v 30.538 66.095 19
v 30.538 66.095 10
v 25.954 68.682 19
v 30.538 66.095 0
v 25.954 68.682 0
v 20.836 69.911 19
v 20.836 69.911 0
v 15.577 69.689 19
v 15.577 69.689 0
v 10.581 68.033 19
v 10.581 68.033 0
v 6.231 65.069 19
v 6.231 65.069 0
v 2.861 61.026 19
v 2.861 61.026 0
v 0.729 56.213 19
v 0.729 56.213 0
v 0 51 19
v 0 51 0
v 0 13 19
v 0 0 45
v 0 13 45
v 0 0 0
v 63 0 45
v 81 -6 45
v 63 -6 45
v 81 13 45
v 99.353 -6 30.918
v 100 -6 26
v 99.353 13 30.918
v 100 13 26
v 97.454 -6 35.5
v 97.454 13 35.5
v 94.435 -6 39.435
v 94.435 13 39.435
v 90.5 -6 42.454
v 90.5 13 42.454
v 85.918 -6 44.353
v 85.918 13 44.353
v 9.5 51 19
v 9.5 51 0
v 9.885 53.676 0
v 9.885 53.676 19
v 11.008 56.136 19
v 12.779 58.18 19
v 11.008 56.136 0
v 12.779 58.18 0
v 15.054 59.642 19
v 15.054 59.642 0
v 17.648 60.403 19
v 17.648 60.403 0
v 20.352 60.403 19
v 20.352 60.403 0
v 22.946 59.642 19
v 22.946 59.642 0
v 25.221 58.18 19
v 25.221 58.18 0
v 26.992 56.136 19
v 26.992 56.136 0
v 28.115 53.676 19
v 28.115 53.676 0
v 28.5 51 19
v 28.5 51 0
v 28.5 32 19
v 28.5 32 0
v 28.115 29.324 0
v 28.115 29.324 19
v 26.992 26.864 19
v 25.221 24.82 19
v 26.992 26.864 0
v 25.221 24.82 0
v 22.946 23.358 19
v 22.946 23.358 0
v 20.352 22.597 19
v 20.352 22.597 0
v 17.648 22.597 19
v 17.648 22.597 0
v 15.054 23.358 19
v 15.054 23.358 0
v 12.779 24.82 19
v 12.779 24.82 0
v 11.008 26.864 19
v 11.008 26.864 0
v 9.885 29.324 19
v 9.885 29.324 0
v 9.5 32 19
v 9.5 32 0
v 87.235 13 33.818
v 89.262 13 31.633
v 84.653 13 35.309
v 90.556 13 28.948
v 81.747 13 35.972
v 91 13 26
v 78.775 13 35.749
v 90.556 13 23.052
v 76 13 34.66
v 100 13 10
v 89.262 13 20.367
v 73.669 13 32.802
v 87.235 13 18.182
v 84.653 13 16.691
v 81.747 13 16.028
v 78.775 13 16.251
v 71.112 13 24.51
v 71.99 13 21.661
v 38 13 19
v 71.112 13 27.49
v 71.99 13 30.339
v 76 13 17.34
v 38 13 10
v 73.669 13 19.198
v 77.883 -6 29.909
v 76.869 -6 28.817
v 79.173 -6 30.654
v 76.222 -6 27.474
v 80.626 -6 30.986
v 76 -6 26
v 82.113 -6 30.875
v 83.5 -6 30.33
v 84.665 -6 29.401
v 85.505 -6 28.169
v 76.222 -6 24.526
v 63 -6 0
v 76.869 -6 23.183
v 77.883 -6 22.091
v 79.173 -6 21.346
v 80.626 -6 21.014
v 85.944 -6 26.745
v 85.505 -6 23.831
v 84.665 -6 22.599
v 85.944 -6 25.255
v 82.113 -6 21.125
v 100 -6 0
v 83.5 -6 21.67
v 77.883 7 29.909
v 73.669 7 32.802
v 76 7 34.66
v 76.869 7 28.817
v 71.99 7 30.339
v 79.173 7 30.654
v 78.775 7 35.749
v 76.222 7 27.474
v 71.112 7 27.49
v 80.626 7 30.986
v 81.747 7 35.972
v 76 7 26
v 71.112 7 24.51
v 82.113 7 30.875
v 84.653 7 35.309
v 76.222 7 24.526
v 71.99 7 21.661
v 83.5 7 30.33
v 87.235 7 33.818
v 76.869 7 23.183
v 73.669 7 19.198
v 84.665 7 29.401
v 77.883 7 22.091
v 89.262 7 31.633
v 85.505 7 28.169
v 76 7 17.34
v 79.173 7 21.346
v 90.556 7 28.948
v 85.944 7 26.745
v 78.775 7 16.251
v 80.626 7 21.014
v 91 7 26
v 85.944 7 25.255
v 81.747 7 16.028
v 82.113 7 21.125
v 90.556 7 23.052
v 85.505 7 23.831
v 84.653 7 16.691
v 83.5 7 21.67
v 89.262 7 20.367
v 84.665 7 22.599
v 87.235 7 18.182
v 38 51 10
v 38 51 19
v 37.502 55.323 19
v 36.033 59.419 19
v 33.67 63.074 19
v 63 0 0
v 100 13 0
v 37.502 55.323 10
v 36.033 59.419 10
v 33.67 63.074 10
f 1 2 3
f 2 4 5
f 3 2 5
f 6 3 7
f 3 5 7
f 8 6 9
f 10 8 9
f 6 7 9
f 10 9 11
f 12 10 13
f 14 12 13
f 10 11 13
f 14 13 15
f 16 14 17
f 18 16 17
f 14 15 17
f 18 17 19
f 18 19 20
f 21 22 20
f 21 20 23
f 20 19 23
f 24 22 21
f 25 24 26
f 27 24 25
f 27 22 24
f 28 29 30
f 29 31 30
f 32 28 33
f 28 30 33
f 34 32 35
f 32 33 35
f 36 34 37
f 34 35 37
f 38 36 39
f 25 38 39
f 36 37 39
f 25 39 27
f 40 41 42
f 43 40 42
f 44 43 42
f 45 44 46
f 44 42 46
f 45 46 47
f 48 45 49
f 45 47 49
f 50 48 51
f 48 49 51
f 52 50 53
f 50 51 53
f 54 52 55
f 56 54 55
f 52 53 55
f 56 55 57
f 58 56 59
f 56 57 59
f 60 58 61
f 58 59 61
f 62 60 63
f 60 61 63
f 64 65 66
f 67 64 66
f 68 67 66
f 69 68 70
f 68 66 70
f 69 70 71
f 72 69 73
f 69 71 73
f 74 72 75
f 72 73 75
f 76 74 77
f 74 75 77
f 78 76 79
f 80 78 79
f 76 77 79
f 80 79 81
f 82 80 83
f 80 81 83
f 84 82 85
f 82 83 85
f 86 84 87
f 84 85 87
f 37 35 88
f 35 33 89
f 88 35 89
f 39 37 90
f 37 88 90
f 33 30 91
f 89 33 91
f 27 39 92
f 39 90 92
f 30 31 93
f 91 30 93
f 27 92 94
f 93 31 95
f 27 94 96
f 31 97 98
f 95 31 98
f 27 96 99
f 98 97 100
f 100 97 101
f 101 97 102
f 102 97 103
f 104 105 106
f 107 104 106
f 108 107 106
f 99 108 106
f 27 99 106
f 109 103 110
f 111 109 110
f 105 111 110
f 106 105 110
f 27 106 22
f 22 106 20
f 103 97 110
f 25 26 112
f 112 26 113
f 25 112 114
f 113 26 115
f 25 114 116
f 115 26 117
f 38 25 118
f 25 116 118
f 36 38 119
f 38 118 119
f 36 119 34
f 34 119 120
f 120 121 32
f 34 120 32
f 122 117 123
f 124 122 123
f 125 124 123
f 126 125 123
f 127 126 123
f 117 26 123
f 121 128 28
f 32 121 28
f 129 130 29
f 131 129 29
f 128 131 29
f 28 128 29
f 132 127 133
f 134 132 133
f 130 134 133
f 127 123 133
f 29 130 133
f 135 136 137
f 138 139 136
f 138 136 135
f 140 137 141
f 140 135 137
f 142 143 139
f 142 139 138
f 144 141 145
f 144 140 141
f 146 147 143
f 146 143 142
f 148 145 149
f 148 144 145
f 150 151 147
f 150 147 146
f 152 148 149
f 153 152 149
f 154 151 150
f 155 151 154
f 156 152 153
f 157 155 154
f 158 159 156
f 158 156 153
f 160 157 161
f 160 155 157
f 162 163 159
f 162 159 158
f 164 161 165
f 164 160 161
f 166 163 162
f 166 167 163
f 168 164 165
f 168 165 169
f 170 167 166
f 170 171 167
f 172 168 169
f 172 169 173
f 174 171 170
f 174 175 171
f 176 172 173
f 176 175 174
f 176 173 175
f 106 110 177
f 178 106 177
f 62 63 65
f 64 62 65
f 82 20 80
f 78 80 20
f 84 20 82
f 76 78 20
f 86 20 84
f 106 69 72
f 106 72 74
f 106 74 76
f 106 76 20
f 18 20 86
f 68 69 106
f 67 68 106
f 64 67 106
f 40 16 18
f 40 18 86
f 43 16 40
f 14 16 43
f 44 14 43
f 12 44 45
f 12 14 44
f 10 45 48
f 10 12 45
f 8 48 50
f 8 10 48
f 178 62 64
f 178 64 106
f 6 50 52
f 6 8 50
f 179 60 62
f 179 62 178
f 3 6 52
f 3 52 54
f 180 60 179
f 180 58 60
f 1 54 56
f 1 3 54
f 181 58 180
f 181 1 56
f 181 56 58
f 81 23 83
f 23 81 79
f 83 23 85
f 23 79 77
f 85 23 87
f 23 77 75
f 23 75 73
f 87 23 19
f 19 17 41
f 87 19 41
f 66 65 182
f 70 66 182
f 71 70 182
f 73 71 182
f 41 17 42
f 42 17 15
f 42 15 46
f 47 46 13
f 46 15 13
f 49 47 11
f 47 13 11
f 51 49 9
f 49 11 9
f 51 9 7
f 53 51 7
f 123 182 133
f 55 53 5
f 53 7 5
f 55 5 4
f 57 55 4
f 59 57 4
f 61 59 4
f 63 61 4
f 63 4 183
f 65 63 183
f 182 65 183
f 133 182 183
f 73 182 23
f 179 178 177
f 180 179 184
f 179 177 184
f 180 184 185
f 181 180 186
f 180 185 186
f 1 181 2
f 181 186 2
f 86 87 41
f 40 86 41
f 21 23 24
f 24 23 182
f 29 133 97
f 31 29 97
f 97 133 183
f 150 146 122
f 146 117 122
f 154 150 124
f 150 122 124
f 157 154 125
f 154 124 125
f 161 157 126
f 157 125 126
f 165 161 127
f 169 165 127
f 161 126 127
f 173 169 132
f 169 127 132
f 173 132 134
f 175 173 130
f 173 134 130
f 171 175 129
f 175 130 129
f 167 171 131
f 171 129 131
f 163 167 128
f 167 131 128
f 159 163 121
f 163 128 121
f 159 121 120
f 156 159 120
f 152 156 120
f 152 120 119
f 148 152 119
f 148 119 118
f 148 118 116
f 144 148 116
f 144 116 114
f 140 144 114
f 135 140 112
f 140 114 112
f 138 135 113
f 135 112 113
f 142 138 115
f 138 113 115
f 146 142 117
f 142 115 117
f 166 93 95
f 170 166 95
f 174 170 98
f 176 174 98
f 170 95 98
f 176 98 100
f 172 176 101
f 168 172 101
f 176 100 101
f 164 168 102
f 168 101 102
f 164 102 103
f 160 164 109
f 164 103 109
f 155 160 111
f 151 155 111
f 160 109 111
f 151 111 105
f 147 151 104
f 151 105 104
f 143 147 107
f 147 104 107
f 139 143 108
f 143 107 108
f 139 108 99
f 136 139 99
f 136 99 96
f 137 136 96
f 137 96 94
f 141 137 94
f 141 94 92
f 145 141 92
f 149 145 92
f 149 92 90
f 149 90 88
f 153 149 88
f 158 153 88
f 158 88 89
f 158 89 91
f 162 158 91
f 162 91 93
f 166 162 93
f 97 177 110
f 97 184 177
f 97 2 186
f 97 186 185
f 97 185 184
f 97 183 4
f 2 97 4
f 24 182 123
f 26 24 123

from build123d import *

# Parameters (mm, degrees)
BOSS_EXTRUDE1_DEPTH                     = 45
BOSS_EXTRUDE2_DEPTH                     = 19
BOSS_EXTRUDE3_DEPTH                     = 10
FILLET1_R                               = 19
CBORE_FOR_M5_HEX_HEAD_BOLT1_D           = 10
CBORE_FOR_M5_HEX_HEAD_BOLT1_DEPTH       = 20
CBORE_FOR_M5_HEX_HEAD_BOLT1_CBORE_D     = 20
CBORE_FOR_M5_HEX_HEAD_BOLT1_CBORE_DEPTH = 6
CBORE_FOR_M5_HEX_HEAD_BOLT1_TIP         = 2.886751346


with BuildPart() as part:
    # Sketch1 → Boss-Extrude1 (new body)
    with BuildSketch(Plane.XY):
        Polygon((0, 13), (0, 0), (63, 0), (63, -6), (100, -6), (100, 13), (38, 13), align=None)
    extrude(amount=BOSS_EXTRUDE1_DEPTH)

    # Sketch1<3> → Boss-Extrude2 (add)
    with BuildSketch(Plane.XY):
        with BuildLine():
            Line((0, 51), (0, 13))
            Line((0, 13), (38, 13))
            Line((38, 13), (38, 51))
            ThreePointArc((38, 51), (36.032775759, 59.419296285), (30.538468428, 66.095156386))
            ThreePointArc((30.538468428, 66.095156386), (10.580703715, 68.032775759), (0, 51))
        make_face()
        with BuildLine():
            Line((9.5, 32), (9.5, 51))
            ThreePointArc((9.5, 51), (19, 60.5), (28.5, 51))
            Line((28.5, 51), (28.5, 32))
            ThreePointArc((28.5, 32), (19, 22.5), (9.5, 32))
        make_face(mode=Mode.SUBTRACT)
    extrude(amount=BOSS_EXTRUDE2_DEPTH)

    # Sketch1<4> → Boss-Extrude3 (add)
    with BuildSketch(Plane.XY):
        with BuildLine():
            Line((38, 51), (38, 13))
            Line((38, 13), (100, 13))
            Line((100, 13), (30.538468428, 66.095156386))
            ThreePointArc((30.538468428, 66.095156386), (36.032775759, 59.419296285), (38, 51))
        make_face()
    extrude(amount=BOSS_EXTRUDE3_DEPTH)

    # Fillet1
    fillet1_edges = [part.edges().sort_by_distance(p)[0] for p in [
        (100, 3.5, 45),
    ]]
    fillet(fillet1_edges, radius=FILLET1_R)

    # CBORE for M5 Hex Head Bolt1
    with Locations(Plane(origin=(0, 13, 0), x_dir=(1, 0, 0), z_dir=(0, 1, 0))):
        with Locations((81, -26)):
            CounterBoreHole(CBORE_FOR_M5_HEX_HEAD_BOLT1_D / 2, CBORE_FOR_M5_HEX_HEAD_BOLT1_CBORE_D / 2, CBORE_FOR_M5_HEX_HEAD_BOLT1_CBORE_DEPTH, depth=CBORE_FOR_M5_HEX_HEAD_BOLT1_DEPTH)
            with Locations((0, 0, -(CBORE_FOR_M5_HEX_HEAD_BOLT1_DEPTH + CBORE_FOR_M5_HEX_HEAD_BOLT1_TIP / 2))):  # 120° drill point
                Cone(0, CBORE_FOR_M5_HEX_HEAD_BOLT1_D / 2, CBORE_FOR_M5_HEX_HEAD_BOLT1_TIP, mode=Mode.SUBTRACT)


solid = part.part
